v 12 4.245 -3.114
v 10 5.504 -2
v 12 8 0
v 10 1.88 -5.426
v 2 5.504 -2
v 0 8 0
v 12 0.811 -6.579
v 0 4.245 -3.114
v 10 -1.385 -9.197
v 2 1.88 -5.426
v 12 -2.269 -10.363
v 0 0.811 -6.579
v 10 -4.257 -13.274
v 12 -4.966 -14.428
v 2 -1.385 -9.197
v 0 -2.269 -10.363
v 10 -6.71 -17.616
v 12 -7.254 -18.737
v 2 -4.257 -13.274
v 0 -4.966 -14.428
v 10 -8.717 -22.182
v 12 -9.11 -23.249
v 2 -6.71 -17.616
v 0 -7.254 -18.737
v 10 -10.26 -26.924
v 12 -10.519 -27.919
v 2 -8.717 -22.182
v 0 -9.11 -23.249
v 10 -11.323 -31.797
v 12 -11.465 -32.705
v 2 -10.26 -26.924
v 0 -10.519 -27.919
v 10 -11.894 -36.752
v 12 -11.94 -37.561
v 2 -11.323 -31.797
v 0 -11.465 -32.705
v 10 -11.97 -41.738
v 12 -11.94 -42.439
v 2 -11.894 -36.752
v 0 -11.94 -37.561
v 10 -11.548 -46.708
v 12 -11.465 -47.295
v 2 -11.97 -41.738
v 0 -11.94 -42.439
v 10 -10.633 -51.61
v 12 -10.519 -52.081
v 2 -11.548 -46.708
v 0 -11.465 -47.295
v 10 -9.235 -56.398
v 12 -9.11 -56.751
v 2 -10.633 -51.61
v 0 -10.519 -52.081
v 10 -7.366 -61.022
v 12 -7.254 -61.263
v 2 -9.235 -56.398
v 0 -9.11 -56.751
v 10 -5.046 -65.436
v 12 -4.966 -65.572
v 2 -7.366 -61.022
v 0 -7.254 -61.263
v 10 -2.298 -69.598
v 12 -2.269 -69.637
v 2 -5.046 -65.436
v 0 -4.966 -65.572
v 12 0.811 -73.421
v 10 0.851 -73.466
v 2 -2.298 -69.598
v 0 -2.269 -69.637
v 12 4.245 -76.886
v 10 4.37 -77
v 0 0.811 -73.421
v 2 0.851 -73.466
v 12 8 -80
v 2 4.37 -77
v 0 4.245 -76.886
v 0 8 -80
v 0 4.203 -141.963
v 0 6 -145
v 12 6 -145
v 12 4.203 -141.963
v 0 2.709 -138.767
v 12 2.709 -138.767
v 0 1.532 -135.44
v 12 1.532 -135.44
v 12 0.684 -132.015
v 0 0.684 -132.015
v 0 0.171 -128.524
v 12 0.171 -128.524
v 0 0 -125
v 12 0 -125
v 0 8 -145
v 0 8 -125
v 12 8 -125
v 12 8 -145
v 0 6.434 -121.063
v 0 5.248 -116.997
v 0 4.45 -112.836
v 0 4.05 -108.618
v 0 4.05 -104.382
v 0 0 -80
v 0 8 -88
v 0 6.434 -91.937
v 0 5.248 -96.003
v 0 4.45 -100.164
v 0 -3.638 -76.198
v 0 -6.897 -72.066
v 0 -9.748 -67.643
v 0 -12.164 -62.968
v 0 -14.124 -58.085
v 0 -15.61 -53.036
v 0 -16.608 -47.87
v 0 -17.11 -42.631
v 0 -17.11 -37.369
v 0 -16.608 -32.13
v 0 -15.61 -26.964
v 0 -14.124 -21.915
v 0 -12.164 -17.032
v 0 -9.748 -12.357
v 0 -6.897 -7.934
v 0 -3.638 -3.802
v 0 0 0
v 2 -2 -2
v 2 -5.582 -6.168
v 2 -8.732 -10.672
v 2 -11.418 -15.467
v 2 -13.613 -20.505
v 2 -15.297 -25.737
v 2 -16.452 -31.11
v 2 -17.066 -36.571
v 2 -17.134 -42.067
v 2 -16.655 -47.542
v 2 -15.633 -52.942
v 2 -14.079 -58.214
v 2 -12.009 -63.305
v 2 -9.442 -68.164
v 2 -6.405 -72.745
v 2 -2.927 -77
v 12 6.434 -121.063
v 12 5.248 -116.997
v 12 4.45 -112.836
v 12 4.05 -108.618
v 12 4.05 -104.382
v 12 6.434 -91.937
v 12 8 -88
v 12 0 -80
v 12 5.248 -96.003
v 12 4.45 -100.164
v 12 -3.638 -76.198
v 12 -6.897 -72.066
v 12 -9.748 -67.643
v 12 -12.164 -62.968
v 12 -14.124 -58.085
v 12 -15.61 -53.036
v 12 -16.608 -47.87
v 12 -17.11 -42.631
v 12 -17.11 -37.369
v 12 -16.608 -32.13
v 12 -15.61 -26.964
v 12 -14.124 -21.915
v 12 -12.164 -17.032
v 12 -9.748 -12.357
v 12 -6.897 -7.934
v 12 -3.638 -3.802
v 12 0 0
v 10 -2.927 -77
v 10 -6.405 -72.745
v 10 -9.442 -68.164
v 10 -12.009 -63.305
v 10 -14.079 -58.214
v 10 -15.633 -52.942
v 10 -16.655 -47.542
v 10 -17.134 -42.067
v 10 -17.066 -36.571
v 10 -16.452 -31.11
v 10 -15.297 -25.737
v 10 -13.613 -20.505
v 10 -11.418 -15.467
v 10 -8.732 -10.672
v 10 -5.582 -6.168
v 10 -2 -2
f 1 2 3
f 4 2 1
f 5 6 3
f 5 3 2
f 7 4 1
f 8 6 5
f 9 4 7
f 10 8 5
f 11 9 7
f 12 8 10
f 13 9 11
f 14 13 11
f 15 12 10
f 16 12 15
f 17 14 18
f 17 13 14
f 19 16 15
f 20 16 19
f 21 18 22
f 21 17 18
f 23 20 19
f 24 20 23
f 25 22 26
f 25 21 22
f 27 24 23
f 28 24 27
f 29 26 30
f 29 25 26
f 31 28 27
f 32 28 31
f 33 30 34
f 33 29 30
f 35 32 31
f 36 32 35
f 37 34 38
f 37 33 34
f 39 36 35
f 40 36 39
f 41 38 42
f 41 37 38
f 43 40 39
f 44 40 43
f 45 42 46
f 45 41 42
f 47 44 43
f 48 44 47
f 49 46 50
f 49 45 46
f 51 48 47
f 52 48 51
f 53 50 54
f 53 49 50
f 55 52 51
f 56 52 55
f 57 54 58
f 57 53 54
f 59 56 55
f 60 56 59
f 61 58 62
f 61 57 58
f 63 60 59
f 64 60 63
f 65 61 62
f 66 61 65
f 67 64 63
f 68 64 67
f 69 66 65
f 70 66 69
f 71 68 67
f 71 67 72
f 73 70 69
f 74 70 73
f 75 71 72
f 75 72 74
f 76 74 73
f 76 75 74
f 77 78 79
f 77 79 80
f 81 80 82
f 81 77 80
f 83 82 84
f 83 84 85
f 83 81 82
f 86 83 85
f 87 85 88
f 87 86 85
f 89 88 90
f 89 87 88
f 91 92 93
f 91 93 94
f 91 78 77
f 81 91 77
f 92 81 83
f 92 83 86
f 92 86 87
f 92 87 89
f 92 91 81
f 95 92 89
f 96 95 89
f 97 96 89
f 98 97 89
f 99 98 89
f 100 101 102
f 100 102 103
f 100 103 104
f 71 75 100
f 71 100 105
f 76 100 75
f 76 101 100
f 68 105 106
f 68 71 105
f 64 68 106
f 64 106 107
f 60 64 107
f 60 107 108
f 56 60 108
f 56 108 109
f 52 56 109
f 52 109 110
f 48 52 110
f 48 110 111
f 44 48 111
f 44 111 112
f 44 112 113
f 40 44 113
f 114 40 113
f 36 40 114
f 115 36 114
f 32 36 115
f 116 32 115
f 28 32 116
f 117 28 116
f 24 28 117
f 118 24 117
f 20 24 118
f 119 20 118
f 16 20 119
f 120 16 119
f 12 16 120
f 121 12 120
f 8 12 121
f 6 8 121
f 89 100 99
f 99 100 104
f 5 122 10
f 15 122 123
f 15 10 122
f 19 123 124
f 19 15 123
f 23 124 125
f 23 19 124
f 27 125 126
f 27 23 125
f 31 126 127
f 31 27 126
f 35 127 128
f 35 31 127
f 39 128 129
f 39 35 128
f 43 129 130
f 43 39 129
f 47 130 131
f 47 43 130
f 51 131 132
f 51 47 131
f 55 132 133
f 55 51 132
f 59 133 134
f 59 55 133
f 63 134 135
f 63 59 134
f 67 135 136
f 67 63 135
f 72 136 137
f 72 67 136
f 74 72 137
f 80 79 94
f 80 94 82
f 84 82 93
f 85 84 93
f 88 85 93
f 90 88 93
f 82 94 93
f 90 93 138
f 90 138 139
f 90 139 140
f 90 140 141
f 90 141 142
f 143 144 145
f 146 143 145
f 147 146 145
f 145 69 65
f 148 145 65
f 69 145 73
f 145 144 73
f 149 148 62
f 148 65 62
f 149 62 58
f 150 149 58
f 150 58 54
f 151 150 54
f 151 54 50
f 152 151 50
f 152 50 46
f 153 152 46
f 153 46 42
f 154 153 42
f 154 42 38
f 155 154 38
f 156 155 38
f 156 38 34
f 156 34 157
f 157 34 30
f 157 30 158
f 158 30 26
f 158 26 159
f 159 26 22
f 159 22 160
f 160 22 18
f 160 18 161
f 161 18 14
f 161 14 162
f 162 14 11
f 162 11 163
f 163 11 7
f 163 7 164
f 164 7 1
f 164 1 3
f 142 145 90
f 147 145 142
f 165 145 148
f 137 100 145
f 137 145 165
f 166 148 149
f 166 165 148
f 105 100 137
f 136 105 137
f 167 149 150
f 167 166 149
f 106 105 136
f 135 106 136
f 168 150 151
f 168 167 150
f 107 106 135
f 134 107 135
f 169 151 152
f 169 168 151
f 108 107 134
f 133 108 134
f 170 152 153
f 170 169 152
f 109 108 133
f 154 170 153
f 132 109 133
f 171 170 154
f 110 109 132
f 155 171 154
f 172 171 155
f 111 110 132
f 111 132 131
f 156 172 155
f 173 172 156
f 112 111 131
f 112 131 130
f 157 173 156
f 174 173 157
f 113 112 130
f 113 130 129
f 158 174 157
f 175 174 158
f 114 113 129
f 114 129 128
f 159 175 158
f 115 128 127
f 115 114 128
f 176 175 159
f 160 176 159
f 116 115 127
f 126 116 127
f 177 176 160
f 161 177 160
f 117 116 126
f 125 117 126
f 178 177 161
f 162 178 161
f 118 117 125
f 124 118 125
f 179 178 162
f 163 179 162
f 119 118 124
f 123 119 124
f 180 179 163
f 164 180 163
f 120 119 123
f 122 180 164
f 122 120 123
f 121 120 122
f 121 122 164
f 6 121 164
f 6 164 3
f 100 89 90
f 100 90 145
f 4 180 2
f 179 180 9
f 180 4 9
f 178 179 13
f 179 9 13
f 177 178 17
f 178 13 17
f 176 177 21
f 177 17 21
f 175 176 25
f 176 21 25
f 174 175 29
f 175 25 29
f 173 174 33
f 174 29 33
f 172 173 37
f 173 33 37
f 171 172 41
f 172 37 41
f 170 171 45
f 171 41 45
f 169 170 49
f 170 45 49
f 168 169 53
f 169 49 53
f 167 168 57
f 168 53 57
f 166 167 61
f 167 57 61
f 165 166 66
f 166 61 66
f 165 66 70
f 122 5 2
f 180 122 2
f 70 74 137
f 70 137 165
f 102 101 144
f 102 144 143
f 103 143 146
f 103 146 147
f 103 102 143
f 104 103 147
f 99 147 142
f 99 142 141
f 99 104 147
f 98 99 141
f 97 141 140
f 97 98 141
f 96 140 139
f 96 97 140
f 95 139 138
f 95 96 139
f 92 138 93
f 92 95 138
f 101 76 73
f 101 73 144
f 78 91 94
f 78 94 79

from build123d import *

# Parameters (mm, degrees)
BOSS_EXTRUDE1_DEPTH     = 12
SKETCH2_W               = 8
SKETCH2_H               = 75
CUT_EXTRUDE1_DEPTH      = 9
CUT_EXTRUDE1_DEPTH_BACK = 18.172456897


with BuildPart() as part:
    # Sketch1 → Boss-Extrude1 (new body)
    with BuildSketch(Plane(origin=(0, 0, 0), x_dir=(0, 0, -1), z_dir=(1, 0, 0))):
        with BuildLine():
            Line((0, 0), (0, 8))
            ThreePointArc((0, 8), (40, -12), (80, 8))
            Line((80, 8), (88, 8))
            ThreePointArc((88, 8), (106.5, 4), (125, 8))
            Line((125, 8), (145, 8))
            Line((145, 8), (145, 6))
            ThreePointArc((145, 6), (135.440306509, 1.532311637), (125, 0))
            Line((125, 0), (80, 0))
            ThreePointArc((80, 0), (40, -17.172456897), (0, 0))
        make_face()
    extrude(amount=BOSS_EXTRUDE1_DEPTH)

    # Sketch2 → Cut-Extrude1 (cut, two sides)
    with BuildSketch(Plane(origin=(0, 0, 0), x_dir=(1, 0, 0), z_dir=(0, 1, 0))) as cut_extrude1_sk:
        with Locations((6, 39.5)):
            Rectangle(SKETCH2_W, SKETCH2_H)
    extrude(amount=CUT_EXTRUDE1_DEPTH, mode=Mode.SUBTRACT)
    extrude(cut_extrude1_sk.sketch, amount=-CUT_EXTRUDE1_DEPTH_BACK, mode=Mode.SUBTRACT)


solid = part.part
